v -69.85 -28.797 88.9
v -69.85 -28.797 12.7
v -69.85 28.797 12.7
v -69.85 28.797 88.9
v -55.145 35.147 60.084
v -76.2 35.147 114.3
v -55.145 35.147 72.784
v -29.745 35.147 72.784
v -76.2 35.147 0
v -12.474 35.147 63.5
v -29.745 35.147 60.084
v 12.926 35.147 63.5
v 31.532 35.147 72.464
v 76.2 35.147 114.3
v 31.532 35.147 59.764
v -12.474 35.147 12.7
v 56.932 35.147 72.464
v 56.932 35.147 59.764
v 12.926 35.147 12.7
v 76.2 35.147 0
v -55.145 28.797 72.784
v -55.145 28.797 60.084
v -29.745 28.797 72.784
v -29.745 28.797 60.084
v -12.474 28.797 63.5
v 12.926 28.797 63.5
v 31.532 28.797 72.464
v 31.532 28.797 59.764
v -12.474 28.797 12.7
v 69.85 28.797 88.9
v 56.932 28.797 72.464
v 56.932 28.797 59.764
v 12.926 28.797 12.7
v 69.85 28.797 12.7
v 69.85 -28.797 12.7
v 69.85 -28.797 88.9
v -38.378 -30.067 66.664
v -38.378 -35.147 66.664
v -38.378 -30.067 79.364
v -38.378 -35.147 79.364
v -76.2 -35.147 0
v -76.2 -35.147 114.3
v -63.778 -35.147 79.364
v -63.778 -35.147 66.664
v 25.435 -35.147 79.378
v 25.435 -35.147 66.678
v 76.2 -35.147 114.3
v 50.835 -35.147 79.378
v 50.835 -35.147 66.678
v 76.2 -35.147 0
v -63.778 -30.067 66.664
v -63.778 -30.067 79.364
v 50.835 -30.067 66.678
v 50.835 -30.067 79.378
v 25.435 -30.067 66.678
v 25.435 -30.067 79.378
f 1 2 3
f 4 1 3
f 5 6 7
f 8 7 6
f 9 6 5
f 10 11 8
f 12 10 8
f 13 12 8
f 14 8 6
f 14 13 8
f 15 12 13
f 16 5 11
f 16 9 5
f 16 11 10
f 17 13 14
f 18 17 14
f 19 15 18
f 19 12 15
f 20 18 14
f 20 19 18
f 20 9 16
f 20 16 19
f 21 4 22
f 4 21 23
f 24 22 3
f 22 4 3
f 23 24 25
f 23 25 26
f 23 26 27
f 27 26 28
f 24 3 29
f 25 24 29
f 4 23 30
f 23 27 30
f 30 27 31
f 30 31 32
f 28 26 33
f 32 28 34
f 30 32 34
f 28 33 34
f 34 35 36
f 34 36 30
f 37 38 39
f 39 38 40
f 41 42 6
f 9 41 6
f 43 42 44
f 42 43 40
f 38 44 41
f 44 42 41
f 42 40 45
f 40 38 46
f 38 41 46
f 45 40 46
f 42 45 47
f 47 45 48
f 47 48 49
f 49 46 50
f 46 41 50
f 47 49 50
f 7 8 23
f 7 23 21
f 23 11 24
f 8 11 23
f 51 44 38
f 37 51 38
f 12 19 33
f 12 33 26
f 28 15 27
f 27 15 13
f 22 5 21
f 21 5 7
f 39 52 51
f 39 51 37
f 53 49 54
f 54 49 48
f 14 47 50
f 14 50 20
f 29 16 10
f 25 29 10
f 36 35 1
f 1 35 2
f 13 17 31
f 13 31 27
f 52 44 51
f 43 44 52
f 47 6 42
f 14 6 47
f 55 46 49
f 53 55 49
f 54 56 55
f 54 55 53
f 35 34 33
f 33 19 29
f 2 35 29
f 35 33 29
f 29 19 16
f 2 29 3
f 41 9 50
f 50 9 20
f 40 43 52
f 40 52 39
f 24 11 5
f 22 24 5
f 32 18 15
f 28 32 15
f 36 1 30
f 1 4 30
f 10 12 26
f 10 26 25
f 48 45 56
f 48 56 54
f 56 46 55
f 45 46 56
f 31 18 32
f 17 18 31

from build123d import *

# Parameters (mm, degrees)
F0_W     = 152.4
F0_H     = 70.293026
F1_DEPTH = 12.7
F2_W     = 6.35
F2_H     = 57.593026
F3_DEPTH = 76.2
F4_W     = 25.4
F4_H     = 50.8
F4_H_2   = 12.7
F5_DEPTH = 6.35
F6_W     = 25.4
F6_H     = 12.7
F7_DEPTH = 5.08
F8_W     = 152.4
F8_H     = 70.293026
F9_DEPTH = 25.4


with BuildPart() as f1:
    # F0 (on Top) → F1 (new body)
    with BuildSketch(Plane.XY):
        Rectangle(F0_W, F0_H)
    extrude(amount=F1_DEPTH)

    # F2 (on face) → F3 (join)
    with BuildSketch(Plane.XY.offset(12.7)):
        Polygon((-70.562325, 35.146513), (-76.2, 35.146513), (-76.2, 28.796513), (-69.85, 28.796513), (69.85, 28.796513), (76.2, 28.796513), (76.2, 35.146513), (-63.181333, 35.146513), align=None)
        with Locations((-73.025, 0)):
            Rectangle(F2_W, F2_H)
        Polygon((-69.85, -28.796513), (-76.2, -28.796513), (-76.2, -35.146513), (76.2, -35.146513), (76.2, -28.796513), (69.85, -28.796513), align=None)
        with Locations((73.025, 0)):
            Rectangle(F2_W, F2_H)
    extrude(amount=F3_DEPTH)

    # F4 (on face) → F5 (cut, through all)
    with BuildSketch(Plane(origin=(0, 35.146513, 0), x_dir=(-1, 0, 0), z_dir=(0, 1, 0))):
        with Locations((-0.226117, 38.1)):
            Rectangle(F4_W, F4_H)
        with Locations((-44.232082, 66.113808)):
            Rectangle(F4_W, F4_H_2)
        with Locations((42.445415, 66.433654)):
            Rectangle(F4_W, F4_H_2)
    extrude(amount=-F5_DEPTH, mode=Mode.SUBTRACT)

    # F6 (on face) → F7 (cut)
    with BuildSketch(Plane.XZ.offset(35.146513)):
        with Locations((-51.077663, 73.014069)):
            Rectangle(F6_W, F6_H)
        with Locations((38.134995, 73.027868)):
            Rectangle(F6_W, F6_H)
    extrude(amount=-F7_DEPTH, mode=Mode.SUBTRACT)

    # F8 (on face) → F9 (join)
    with BuildSketch(Plane.XY.offset(88.9)):
        Rectangle(F8_W, F8_H)
    extrude(amount=F9_DEPTH)


solid = f1.part
